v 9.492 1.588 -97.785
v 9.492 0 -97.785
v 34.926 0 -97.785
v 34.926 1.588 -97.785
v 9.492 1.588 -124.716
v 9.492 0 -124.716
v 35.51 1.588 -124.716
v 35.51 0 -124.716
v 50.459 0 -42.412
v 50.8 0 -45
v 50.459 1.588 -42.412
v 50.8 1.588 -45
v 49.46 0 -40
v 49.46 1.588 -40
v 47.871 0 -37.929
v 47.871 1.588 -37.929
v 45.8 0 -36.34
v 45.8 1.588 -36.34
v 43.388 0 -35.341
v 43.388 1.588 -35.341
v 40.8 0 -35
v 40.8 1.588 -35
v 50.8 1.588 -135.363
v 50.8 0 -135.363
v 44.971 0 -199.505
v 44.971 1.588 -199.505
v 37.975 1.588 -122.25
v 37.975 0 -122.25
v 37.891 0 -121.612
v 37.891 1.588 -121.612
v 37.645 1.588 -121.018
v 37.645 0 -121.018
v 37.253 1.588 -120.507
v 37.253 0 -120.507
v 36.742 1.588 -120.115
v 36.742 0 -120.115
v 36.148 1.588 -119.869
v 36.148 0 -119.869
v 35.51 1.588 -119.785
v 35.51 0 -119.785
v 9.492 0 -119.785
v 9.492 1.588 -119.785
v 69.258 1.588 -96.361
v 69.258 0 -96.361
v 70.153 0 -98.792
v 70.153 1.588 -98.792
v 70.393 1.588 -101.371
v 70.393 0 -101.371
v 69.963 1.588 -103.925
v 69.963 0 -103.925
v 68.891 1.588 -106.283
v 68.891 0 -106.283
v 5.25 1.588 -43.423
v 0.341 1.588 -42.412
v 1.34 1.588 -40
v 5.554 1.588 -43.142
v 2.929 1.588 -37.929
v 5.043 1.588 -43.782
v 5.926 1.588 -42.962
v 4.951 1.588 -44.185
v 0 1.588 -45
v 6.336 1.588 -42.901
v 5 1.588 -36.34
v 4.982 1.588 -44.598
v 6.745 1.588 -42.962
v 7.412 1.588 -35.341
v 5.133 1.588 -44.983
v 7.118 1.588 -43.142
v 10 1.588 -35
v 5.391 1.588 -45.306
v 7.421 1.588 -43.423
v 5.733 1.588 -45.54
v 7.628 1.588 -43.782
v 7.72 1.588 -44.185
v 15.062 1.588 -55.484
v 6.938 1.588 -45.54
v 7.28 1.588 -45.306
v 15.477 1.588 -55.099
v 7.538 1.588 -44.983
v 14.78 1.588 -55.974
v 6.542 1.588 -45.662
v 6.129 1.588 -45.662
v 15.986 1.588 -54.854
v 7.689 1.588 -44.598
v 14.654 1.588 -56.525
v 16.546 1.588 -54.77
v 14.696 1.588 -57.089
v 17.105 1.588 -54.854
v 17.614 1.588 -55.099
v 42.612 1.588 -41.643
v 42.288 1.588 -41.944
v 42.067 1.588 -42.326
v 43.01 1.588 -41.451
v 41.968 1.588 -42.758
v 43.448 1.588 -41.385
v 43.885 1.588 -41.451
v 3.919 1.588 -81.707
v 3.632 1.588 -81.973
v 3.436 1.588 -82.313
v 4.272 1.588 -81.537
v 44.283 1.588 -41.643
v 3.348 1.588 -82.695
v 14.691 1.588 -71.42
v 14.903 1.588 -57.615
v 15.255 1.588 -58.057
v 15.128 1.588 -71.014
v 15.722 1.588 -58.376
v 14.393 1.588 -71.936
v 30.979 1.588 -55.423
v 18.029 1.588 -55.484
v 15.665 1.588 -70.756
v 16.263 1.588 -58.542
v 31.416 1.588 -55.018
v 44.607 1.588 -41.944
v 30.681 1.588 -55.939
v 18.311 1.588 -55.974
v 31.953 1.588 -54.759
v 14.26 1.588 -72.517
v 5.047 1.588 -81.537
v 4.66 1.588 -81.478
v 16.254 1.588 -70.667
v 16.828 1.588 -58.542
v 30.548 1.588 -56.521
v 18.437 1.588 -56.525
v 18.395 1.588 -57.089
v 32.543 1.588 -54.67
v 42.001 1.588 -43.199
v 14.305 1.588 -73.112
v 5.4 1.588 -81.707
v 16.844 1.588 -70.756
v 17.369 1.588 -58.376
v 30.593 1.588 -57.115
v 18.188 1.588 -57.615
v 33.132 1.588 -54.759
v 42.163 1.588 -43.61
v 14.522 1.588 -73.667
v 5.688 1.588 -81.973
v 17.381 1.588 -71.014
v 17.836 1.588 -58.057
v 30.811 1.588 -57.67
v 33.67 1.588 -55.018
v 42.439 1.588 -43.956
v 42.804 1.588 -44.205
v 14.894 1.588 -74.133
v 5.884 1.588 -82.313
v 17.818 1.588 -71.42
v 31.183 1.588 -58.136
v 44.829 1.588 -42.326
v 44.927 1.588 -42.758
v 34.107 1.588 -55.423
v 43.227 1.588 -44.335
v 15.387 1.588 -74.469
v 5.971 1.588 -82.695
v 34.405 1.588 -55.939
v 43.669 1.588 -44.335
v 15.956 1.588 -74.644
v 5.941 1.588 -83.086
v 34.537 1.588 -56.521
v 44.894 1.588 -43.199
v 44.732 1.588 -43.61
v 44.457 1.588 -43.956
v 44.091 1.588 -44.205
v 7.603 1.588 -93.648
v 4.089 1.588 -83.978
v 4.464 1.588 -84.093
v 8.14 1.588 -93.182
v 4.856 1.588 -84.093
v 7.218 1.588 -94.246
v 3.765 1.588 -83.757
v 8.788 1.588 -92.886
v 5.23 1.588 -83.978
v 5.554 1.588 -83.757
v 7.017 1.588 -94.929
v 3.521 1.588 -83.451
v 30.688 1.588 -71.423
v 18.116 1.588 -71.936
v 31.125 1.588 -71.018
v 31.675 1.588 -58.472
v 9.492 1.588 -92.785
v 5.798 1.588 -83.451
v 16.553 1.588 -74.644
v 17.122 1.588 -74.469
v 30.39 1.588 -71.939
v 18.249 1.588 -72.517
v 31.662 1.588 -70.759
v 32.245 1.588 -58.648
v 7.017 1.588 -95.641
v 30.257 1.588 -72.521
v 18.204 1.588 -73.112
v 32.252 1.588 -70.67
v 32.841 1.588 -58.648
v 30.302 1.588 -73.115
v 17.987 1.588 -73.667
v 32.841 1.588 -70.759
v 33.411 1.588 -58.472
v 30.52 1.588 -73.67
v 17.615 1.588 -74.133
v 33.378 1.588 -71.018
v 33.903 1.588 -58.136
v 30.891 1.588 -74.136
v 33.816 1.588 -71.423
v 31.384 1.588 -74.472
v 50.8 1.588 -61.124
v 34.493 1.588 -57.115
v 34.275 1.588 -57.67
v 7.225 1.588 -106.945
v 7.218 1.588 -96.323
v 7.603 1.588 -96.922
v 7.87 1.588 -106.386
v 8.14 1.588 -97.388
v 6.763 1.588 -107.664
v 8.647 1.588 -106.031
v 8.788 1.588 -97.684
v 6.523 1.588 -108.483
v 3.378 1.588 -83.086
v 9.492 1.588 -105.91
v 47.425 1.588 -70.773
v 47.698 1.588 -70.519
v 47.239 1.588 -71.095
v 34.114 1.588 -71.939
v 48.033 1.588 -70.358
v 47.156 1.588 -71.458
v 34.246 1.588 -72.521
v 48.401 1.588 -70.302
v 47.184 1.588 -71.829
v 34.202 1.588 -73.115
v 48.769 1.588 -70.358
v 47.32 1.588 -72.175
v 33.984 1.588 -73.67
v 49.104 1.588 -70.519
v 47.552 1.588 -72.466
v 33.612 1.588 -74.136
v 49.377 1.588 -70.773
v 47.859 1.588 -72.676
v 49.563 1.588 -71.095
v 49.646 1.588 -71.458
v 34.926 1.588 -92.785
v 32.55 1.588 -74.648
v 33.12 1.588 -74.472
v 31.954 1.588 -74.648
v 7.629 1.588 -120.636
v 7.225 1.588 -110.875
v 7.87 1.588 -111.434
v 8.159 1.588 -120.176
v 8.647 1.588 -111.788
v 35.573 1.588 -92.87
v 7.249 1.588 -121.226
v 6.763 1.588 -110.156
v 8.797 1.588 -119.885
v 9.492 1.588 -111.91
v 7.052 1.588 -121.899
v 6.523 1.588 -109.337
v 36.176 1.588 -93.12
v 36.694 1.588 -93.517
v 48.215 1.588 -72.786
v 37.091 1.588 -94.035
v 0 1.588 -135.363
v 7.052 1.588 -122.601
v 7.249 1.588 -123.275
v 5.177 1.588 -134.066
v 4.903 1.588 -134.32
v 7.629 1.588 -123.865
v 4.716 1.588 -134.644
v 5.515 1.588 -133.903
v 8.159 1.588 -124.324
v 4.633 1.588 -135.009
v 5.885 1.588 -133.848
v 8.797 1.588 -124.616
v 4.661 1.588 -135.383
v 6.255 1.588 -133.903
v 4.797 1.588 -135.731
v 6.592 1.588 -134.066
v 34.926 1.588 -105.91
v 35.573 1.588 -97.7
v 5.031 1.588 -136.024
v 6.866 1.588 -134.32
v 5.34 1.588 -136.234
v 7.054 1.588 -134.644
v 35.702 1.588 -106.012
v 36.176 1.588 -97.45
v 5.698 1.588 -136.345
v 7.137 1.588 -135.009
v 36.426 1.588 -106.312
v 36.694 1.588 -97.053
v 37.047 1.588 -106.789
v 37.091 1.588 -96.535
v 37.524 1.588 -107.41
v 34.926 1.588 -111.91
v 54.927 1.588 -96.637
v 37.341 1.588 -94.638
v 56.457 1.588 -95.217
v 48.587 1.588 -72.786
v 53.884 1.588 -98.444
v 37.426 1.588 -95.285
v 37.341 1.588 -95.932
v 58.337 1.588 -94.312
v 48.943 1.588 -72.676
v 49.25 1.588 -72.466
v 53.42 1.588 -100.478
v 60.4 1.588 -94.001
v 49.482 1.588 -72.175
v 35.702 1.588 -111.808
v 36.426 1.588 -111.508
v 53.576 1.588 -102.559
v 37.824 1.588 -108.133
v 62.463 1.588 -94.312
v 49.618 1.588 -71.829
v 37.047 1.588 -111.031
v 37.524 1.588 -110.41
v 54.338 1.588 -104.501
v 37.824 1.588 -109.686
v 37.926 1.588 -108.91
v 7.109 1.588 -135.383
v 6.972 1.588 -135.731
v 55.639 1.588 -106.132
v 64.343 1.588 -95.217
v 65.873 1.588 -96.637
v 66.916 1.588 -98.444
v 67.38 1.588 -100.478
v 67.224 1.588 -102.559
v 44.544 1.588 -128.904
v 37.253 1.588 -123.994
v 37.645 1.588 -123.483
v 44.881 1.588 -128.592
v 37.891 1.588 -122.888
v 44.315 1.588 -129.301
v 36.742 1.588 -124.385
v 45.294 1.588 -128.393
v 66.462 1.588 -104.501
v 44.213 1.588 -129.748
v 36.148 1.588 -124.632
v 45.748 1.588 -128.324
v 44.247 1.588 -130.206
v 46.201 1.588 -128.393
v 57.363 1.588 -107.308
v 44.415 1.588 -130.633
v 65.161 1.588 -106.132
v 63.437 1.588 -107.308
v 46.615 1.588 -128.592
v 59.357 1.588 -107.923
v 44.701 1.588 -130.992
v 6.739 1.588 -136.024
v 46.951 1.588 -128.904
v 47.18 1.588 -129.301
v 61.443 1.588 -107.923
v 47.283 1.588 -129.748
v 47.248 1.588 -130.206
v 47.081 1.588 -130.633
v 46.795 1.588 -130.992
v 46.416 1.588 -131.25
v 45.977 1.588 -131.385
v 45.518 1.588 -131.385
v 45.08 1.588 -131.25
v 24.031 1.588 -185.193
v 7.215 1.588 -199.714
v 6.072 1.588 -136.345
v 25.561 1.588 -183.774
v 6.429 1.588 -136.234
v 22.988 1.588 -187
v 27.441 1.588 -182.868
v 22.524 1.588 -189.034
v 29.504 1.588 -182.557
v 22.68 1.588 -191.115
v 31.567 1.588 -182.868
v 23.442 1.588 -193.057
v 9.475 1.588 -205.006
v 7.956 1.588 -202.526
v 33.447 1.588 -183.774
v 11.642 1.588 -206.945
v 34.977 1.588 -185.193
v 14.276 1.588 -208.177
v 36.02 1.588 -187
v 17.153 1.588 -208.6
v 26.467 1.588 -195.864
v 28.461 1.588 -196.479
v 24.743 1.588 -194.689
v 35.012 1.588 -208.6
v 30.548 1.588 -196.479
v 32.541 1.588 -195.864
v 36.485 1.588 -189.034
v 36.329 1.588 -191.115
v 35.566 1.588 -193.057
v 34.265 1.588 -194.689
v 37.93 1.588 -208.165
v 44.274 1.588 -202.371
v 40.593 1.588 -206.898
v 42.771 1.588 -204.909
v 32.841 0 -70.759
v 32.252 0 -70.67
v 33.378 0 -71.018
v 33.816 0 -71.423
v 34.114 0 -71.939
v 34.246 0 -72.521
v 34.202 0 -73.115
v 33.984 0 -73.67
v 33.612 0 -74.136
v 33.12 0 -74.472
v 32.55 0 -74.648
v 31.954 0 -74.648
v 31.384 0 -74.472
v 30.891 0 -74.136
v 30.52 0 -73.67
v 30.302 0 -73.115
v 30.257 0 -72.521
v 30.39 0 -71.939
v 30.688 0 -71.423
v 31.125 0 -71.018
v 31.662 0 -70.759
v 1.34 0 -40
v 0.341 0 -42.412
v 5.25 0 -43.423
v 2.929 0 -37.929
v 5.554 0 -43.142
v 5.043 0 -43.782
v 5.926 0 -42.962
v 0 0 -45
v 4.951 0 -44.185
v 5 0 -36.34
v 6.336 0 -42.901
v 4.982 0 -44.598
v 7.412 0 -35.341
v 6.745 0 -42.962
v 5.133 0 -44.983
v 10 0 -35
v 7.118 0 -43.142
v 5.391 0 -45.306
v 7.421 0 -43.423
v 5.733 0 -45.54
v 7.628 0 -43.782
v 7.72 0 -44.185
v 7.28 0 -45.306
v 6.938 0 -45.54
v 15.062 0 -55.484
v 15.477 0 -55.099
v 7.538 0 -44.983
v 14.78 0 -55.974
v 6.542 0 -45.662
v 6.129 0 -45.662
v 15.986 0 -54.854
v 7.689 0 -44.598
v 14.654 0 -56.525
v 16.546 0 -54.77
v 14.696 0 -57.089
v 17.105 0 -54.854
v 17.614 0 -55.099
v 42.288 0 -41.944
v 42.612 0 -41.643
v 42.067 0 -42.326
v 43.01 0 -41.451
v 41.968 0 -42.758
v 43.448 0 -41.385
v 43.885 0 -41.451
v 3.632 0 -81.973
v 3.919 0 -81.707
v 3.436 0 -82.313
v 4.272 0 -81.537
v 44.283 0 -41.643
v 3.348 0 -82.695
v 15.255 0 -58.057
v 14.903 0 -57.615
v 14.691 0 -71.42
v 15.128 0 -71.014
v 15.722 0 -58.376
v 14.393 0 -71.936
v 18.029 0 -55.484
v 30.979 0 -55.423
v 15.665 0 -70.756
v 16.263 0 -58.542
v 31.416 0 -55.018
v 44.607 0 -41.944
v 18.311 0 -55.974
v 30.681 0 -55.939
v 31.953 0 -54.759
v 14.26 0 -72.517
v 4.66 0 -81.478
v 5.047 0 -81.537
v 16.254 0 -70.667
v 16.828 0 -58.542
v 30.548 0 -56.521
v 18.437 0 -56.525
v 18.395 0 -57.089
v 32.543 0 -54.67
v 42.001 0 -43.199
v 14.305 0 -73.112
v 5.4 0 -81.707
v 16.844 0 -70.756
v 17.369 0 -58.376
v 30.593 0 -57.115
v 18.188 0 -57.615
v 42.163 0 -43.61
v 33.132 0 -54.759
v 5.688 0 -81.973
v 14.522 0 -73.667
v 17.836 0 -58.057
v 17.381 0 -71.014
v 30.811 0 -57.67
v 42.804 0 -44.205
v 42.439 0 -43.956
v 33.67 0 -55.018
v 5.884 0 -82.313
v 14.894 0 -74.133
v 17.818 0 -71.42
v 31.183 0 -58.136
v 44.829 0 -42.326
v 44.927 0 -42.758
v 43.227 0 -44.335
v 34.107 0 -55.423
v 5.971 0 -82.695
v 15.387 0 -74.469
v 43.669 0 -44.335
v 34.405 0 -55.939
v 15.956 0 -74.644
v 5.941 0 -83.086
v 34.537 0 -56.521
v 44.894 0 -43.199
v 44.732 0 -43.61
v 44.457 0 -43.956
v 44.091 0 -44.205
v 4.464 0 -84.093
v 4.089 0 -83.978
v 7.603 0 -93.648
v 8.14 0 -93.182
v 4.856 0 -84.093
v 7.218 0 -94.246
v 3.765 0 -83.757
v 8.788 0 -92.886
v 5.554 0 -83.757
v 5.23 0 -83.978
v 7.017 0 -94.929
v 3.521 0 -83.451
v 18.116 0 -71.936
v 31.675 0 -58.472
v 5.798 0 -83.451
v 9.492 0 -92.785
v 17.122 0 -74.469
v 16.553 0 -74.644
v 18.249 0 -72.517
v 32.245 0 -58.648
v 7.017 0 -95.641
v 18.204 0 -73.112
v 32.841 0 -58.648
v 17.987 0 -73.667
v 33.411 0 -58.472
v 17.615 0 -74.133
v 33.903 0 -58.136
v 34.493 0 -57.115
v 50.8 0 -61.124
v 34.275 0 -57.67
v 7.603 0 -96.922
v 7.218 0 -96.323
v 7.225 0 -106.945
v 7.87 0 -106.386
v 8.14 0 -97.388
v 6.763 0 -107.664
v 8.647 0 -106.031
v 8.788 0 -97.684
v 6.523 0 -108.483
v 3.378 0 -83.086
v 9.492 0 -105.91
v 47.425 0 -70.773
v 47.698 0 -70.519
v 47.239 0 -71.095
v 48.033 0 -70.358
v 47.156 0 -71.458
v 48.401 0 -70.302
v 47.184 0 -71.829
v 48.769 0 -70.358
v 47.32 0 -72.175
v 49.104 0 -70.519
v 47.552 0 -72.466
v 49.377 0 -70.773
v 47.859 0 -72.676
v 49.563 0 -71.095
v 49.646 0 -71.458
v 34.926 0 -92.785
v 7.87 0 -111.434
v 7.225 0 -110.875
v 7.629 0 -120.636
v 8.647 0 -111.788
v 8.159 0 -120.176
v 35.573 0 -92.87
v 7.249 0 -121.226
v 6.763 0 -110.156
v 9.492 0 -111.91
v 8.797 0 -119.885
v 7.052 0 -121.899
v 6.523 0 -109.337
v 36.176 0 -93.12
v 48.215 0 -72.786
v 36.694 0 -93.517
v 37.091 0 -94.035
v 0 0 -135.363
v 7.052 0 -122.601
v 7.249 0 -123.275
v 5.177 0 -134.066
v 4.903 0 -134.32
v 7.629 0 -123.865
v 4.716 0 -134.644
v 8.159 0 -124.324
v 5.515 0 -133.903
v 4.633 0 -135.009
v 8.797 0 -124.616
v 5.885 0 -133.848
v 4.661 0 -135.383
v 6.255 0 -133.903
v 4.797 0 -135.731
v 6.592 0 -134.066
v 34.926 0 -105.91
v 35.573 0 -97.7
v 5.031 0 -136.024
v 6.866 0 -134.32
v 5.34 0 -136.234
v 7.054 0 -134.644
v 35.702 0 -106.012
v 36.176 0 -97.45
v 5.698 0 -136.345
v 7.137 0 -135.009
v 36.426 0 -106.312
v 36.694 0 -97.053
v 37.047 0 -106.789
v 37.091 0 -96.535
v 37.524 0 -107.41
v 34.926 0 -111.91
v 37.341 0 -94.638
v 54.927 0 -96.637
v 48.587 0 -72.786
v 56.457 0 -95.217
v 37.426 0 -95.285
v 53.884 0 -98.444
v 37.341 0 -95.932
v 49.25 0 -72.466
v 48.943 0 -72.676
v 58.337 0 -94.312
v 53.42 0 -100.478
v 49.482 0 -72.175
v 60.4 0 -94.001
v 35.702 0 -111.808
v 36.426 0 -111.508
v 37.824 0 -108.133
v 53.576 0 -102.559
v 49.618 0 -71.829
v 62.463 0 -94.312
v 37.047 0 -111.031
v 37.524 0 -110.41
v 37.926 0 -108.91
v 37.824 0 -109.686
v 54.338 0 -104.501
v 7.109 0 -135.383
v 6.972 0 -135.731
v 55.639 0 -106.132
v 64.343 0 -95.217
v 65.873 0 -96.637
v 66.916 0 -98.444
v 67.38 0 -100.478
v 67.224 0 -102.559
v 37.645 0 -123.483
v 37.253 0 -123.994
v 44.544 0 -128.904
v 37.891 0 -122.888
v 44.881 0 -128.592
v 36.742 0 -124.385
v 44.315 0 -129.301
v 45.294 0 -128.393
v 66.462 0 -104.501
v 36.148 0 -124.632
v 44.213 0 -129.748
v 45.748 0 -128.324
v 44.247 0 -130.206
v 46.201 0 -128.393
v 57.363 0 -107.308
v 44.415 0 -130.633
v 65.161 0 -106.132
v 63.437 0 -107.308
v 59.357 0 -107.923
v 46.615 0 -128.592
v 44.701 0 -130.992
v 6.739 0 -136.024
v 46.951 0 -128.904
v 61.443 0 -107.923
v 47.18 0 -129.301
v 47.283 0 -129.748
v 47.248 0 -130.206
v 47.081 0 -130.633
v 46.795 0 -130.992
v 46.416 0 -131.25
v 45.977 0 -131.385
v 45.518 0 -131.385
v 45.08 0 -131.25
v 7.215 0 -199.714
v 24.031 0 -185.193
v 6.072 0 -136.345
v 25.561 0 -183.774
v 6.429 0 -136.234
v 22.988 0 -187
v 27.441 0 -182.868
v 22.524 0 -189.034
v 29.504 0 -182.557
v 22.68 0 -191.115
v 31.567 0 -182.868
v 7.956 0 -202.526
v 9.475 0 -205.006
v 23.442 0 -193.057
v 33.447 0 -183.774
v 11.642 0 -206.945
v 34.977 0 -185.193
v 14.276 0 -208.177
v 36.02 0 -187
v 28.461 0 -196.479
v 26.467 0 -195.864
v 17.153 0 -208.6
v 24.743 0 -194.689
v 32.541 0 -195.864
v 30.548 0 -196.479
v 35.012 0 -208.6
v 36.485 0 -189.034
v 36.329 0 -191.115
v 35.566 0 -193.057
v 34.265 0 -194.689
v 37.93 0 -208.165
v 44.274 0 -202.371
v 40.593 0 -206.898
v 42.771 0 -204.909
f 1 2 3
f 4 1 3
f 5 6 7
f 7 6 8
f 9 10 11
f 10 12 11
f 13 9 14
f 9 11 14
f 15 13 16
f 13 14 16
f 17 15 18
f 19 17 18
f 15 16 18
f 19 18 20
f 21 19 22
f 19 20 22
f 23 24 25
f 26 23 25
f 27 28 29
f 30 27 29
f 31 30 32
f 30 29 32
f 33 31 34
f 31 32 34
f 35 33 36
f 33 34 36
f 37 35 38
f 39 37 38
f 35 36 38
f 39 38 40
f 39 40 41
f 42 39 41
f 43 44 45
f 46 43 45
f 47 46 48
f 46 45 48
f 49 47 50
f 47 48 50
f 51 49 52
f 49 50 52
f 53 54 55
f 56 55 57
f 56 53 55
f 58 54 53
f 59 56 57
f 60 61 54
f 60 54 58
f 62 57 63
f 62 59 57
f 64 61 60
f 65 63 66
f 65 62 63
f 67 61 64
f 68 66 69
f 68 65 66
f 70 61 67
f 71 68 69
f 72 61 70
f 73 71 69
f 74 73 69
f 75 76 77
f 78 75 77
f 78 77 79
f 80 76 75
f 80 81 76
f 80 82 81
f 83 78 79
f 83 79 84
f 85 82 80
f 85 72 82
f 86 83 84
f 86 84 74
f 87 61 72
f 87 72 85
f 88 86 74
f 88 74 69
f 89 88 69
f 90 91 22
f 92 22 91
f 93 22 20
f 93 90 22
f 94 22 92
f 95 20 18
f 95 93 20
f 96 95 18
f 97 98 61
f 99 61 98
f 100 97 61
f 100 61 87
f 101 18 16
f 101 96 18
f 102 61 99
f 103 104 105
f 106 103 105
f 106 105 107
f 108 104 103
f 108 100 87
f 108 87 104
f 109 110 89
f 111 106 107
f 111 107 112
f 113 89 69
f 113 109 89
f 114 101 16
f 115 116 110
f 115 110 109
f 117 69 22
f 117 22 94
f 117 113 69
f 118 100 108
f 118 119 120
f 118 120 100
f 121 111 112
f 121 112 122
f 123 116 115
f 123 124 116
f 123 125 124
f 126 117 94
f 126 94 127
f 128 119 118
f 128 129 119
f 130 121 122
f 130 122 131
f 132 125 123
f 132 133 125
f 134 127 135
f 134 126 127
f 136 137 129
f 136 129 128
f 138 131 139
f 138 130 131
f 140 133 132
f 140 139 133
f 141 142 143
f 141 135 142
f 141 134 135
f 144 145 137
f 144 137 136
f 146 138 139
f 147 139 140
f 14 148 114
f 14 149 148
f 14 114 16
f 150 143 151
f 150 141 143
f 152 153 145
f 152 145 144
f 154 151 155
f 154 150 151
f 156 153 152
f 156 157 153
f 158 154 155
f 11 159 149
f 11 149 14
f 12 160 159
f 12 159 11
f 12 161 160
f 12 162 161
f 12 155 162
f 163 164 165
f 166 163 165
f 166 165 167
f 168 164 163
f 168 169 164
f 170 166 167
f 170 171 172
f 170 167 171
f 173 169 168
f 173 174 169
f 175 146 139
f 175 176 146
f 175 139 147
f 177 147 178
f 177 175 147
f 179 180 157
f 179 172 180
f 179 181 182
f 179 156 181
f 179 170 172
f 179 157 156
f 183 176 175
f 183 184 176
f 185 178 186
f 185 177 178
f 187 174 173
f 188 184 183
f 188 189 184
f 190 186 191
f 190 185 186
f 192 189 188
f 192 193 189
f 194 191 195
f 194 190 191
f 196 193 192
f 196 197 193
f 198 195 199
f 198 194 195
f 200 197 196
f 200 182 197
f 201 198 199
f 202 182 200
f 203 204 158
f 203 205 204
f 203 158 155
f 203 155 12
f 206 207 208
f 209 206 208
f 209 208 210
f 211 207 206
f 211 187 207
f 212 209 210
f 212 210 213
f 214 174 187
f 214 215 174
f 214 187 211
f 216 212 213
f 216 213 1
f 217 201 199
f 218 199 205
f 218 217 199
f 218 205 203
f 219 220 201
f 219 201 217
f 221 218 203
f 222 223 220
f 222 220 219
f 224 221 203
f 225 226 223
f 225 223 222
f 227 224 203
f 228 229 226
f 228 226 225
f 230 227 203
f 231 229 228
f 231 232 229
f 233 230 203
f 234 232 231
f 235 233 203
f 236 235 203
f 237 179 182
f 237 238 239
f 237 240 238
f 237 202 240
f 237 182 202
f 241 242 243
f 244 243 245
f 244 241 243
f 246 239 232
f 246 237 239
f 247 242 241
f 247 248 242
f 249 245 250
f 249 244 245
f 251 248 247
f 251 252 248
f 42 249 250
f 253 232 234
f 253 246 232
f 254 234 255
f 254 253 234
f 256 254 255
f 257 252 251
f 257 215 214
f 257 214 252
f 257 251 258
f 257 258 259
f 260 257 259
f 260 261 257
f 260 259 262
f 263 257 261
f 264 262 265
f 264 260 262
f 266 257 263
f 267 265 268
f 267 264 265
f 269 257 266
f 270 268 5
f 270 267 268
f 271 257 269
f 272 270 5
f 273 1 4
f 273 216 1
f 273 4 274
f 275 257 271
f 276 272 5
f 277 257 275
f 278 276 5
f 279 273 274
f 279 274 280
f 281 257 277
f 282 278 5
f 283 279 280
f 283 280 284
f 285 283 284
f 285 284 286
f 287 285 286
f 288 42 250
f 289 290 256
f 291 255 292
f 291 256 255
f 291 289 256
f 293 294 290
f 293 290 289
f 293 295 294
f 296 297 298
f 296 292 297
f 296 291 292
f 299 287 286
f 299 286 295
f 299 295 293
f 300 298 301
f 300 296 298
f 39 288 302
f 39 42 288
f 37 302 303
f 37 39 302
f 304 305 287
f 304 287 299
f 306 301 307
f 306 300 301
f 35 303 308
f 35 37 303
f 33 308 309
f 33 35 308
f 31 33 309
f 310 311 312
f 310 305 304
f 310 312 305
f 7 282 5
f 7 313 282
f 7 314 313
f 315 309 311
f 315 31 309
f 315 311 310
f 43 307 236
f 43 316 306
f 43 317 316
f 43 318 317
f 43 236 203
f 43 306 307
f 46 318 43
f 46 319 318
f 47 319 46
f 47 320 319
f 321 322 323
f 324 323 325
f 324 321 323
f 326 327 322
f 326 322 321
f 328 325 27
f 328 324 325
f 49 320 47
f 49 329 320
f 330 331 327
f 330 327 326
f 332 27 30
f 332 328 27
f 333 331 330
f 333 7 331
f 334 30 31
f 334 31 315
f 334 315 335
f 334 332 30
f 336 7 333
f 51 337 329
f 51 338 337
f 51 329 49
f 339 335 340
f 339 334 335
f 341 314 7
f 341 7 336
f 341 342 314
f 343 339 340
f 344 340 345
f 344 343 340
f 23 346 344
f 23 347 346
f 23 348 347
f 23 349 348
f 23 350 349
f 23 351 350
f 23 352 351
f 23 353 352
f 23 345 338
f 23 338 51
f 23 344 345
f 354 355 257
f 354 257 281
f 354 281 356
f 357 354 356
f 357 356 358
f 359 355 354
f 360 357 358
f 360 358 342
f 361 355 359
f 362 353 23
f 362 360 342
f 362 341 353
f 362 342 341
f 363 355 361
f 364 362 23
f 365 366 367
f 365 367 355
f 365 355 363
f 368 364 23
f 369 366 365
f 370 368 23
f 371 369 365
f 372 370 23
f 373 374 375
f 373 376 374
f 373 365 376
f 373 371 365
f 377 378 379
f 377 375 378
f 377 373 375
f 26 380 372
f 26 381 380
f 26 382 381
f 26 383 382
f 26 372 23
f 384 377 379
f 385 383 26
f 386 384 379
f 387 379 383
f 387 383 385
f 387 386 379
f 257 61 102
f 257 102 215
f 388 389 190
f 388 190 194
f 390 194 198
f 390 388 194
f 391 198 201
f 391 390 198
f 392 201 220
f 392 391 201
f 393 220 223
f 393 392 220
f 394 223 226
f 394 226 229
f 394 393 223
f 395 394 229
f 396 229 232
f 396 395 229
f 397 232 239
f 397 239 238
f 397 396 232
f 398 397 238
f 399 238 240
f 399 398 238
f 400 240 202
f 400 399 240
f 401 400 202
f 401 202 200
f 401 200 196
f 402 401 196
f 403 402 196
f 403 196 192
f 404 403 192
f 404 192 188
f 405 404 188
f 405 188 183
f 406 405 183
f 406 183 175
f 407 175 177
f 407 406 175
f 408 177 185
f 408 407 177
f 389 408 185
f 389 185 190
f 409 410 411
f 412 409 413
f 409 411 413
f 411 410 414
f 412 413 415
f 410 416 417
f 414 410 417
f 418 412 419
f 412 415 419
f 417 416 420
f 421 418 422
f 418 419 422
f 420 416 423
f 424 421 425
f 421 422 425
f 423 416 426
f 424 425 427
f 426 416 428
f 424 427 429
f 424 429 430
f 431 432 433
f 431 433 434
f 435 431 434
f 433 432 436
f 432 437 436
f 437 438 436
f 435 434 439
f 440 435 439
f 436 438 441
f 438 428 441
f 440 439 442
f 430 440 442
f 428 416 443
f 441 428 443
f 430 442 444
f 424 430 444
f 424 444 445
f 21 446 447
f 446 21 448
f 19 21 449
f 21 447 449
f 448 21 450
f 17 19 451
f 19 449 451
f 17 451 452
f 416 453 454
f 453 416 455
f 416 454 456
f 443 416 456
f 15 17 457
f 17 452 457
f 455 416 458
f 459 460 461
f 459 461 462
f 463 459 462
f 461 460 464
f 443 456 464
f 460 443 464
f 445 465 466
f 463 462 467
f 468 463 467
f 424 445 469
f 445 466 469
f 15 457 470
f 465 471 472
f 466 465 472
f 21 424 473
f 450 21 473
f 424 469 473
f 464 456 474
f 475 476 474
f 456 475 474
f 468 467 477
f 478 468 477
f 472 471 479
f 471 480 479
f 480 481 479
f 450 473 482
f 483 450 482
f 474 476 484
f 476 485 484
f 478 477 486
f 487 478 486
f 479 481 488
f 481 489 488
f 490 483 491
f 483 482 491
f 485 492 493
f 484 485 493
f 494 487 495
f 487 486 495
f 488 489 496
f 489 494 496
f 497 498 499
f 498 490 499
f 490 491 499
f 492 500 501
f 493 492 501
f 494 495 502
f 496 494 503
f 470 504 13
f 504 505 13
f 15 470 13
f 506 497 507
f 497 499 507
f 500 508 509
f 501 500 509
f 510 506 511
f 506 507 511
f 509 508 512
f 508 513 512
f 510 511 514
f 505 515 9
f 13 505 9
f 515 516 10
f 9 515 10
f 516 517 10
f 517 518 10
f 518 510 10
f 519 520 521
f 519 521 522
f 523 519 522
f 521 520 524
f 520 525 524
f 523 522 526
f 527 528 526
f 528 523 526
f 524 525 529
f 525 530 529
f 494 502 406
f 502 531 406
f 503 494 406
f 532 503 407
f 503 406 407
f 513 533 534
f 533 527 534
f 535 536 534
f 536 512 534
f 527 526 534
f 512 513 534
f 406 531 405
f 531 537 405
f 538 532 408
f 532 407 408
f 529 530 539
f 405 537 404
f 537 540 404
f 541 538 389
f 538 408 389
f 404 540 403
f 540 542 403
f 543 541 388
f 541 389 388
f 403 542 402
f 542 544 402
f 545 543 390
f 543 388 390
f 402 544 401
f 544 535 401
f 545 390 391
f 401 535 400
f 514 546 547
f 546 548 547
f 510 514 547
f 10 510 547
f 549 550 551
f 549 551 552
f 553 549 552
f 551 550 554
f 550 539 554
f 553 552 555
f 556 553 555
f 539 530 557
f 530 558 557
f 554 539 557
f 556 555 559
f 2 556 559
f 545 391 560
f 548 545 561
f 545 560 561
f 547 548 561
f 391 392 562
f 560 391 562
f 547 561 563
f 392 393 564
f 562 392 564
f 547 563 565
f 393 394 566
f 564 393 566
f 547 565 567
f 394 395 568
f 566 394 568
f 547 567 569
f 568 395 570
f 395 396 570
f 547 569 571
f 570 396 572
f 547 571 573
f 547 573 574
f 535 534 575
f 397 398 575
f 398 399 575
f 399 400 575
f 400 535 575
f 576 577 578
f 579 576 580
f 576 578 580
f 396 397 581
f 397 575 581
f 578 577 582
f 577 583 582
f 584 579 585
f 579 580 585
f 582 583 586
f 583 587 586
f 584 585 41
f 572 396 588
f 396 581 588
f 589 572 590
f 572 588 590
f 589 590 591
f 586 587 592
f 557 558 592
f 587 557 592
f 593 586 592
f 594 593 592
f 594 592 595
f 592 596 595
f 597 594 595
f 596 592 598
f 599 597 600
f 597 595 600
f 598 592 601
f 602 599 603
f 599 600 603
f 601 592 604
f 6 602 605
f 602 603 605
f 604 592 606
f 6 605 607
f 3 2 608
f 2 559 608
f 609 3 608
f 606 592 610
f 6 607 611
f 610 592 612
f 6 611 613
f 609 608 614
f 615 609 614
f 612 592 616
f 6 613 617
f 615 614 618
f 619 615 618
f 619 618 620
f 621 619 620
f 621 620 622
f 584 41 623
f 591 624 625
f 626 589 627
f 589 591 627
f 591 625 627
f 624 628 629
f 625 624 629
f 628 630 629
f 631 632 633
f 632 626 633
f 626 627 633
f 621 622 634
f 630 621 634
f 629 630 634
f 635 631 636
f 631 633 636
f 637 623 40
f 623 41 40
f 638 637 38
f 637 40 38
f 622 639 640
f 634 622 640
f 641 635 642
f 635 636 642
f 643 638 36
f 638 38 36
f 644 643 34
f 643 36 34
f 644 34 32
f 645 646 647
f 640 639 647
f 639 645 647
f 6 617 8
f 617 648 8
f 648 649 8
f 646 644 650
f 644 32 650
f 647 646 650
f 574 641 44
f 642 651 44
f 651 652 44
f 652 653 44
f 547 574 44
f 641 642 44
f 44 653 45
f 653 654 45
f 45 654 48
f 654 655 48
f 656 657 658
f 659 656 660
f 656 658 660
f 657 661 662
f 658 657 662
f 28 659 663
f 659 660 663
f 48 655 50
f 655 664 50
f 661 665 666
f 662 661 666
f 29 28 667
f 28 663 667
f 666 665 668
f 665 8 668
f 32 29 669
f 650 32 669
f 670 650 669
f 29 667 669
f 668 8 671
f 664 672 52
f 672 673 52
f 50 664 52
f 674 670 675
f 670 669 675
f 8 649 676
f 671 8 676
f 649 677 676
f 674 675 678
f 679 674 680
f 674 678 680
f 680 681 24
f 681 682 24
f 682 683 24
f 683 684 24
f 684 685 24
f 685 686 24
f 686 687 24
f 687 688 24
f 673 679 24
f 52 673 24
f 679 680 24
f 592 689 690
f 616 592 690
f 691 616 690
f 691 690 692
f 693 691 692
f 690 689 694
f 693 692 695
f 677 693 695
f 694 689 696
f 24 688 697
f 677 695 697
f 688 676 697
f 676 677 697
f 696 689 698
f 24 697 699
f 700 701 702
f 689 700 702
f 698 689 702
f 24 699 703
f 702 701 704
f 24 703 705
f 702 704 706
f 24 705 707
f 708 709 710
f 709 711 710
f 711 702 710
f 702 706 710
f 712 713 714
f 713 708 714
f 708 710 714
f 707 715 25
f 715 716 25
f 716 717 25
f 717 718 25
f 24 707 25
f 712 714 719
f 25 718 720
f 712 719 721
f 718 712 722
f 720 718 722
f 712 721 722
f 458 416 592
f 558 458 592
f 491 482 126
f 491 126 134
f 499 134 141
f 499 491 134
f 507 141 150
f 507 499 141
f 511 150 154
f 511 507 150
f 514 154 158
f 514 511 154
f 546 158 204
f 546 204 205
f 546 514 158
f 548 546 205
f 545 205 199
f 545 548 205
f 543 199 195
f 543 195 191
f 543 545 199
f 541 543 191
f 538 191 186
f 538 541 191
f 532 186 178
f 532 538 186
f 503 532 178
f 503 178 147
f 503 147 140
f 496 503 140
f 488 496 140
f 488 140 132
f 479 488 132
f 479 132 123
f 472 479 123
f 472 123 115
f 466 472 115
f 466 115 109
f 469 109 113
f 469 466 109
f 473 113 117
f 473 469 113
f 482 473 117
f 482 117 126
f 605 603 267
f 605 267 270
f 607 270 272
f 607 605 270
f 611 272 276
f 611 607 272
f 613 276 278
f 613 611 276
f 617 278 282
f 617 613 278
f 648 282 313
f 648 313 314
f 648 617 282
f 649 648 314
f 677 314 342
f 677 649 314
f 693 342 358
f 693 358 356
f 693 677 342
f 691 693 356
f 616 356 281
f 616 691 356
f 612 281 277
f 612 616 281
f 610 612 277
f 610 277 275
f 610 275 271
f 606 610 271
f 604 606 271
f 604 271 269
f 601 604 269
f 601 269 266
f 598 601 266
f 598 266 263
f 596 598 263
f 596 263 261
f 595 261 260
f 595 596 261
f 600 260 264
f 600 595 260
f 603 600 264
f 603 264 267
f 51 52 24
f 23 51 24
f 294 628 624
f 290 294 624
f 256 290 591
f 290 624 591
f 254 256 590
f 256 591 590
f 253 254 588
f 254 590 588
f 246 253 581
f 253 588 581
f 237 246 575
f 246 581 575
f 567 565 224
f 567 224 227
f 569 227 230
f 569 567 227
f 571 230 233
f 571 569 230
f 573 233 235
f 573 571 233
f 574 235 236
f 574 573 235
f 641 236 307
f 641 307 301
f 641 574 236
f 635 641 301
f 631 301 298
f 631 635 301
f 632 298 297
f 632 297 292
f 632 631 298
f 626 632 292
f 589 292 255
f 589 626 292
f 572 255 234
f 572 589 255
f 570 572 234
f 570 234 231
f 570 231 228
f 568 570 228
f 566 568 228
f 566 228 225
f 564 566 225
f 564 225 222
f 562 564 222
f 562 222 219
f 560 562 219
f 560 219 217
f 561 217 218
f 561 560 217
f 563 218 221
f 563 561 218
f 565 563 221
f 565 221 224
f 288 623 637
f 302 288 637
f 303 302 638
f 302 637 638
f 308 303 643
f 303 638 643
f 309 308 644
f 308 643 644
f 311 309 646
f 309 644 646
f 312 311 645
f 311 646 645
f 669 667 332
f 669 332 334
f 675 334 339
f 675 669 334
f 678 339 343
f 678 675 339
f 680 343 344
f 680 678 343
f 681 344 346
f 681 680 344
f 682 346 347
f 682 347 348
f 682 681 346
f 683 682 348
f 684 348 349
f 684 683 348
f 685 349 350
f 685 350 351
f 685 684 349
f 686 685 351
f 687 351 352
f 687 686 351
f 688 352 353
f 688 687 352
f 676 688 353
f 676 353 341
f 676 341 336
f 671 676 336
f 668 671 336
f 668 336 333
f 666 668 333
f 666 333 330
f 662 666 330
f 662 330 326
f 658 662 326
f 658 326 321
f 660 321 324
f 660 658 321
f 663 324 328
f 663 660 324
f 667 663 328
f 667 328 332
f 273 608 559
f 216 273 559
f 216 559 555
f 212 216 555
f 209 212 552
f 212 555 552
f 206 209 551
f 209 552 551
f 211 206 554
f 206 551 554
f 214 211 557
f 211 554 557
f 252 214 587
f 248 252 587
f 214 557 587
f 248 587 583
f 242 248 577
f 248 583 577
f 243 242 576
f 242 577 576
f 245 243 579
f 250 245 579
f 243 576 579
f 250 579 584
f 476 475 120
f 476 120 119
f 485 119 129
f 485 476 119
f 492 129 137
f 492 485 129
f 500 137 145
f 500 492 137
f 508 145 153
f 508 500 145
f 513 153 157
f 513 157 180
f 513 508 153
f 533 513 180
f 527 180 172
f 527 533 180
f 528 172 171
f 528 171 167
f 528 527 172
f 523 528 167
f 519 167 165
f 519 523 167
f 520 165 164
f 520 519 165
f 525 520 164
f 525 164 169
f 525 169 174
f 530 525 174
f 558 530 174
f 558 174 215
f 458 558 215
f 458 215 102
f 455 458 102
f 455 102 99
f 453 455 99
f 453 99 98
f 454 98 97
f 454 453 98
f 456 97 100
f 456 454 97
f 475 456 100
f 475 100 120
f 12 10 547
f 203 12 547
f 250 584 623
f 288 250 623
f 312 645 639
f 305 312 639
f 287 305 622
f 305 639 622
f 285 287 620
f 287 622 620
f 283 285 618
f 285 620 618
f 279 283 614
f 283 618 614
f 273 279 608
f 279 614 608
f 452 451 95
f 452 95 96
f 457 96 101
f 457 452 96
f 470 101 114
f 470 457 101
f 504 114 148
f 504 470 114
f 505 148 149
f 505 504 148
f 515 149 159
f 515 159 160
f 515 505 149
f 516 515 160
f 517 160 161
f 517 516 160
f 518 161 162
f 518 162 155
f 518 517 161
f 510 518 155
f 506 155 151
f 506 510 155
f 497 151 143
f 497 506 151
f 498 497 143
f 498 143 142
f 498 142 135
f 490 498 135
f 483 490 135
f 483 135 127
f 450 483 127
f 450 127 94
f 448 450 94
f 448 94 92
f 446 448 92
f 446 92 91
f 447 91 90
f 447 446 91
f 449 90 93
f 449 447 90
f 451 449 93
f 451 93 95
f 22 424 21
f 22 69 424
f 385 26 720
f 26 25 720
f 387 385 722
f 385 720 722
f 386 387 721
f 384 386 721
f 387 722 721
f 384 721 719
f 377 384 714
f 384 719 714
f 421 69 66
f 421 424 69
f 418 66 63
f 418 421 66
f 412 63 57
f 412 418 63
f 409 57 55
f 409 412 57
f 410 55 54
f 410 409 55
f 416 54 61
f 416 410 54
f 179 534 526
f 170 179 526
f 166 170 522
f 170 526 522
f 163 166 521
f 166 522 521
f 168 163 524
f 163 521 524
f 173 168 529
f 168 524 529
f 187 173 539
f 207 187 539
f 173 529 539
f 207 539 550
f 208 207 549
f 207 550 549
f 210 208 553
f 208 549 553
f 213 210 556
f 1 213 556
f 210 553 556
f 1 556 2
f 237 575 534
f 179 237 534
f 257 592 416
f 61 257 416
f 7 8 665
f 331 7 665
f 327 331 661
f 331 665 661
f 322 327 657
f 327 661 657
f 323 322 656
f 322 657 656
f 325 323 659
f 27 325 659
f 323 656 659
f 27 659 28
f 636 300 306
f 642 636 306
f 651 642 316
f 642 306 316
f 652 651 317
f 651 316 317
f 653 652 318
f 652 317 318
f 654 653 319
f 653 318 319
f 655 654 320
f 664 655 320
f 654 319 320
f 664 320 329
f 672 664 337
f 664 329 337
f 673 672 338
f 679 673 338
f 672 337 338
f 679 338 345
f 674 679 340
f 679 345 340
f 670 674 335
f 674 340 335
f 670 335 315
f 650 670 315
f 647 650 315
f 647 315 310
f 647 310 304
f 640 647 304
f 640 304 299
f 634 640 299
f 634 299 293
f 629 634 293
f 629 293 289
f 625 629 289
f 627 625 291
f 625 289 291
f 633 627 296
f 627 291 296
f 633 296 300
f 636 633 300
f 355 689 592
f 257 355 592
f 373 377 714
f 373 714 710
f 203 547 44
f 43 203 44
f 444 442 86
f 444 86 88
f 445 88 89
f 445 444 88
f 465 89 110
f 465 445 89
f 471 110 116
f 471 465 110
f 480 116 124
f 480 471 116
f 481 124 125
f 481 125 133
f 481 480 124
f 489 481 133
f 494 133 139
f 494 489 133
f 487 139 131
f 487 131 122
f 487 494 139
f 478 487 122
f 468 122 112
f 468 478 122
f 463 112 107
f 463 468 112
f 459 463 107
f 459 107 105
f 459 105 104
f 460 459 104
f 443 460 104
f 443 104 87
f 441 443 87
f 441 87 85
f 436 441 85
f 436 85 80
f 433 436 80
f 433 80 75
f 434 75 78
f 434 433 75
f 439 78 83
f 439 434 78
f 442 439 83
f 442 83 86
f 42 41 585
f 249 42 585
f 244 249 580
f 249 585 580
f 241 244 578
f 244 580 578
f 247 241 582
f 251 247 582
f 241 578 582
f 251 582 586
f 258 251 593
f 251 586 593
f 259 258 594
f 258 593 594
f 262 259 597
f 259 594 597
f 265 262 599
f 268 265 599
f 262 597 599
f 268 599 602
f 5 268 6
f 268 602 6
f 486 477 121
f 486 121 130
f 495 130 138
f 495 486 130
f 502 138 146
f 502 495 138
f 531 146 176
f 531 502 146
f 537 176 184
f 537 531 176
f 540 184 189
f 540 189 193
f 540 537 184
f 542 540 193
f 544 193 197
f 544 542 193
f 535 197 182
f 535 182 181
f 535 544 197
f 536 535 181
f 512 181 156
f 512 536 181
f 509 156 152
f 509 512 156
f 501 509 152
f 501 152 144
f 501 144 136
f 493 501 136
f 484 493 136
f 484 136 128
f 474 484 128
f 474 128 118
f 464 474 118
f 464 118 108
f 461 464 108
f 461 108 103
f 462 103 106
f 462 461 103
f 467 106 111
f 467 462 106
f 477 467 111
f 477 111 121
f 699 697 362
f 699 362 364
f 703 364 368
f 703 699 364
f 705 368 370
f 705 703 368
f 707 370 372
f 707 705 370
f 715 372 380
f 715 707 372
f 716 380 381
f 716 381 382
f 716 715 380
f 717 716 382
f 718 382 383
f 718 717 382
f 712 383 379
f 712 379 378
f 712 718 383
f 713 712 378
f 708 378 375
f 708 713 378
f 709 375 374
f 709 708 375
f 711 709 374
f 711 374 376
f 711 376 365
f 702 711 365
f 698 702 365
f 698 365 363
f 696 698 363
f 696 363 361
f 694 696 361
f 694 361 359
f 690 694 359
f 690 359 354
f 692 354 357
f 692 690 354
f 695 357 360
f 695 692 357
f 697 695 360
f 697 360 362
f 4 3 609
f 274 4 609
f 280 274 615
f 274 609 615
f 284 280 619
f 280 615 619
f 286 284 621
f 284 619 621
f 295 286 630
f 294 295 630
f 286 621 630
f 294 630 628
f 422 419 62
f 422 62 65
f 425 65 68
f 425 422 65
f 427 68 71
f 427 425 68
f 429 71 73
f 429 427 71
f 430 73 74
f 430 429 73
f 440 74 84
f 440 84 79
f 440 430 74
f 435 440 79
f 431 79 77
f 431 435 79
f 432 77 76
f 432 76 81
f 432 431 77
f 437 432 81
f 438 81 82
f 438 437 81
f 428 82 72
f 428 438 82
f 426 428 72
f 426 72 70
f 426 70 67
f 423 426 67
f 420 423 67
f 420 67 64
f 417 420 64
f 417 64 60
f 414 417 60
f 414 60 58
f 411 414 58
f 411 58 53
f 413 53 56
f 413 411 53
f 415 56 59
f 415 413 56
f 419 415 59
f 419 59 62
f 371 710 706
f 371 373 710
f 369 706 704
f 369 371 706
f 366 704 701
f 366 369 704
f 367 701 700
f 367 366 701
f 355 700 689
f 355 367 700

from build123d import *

# Parameters (mm, degrees)
SKETCH1_R           = 1.388229101
SKETCH1_R_2         = 1.896979128
SKETCH1_R_3         = 2
SKETCH1_R_4         = 1.314910669
SKETCH1_R_5         = 1.483383261
SKETCH1_R_6         = 1.248623853
SKETCH1_R_7         = 1.255629307
SKETCH1_R_8         = 7
SKETCH1_R_9         = 1.53911217
BOSS_EXTRUDE1_DEPTH = 1.5875
SKETCH4_W           = 66.272407177
SKETCH4_H           = 27.800260981
CUT_EXTRUDE2_DEPTH  = 20
FILLET3_R           = 10
FILLET4_R           = 10
BOSS_EXTRUDE3_START = -1.5875
BOSS_EXTRUDE3_DEPTH = 1.5875
SKETCH7_R           = 7
CUT_EXTRUDE3_DEPTH  = 1.5875
SKETCH8_W           = 100.106183873
SKETCH8_H           = 60.21728362
CUT_EXTRUDE4_DEPTH  = 35
FILLET5_R           = 10


with BuildPart() as part:
    # Sketch1 → Boss-Extrude1 (new body)
    with BuildSketch(Plane(origin=(0, 0, 0), x_dir=(1, 0, 0), z_dir=(0, 1, 0))):
        with BuildLine():
            Line((42.32729629, 228.6), (10.454309325, 228.6))
            Line((10.454309325, 228.6), (0, 135.362739137))
            Line((0, 135.362739137), (0, 0))
            Line((0, 0), (24.327009544, 0))
            Line((24.327009544, 0), (50.8, 0))
            Line((50.8, 0), (50.8, 64.87909603))
            Line((50.8, 64.87909603), (50.8, 87.423477361))
            Line((50.8, 87.423477361), (50.8, 98.200996728))
            ThreePointArc((50.8, 98.200996728), (50.4, 101.000996728), (50.8, 103.800996728))
            Line((50.8, 103.800996728), (50.8, 104.488200565))
            Line((50.8, 104.488200565), (50.8, 120.619222808))
            Line((50.8, 120.619222808), (50.8, 135.362739137))
            Line((50.8, 135.362739137), (42.32729629, 228.6))
        make_face()
        with Locations(Location((6.335590122, 44.288799513, 0), (0, 0, 270))):
            Circle(SKETCH1_R, mode=Mode.SUBTRACT)
        with Locations(Location((16.545548495, 56.66670766, 0), (0, 0, 270))):
            Circle(SKETCH1_R_2, mode=Mode.SUBTRACT)
        with Locations(Location((32.542900948, 56.67, 0), (0, 0, 270))):
            Circle(SKETCH1_R_3, mode=Mode.SUBTRACT)
        with Locations(Location((4.659546827, 82.793173401, 0), (0, 0, 270))):
            Circle(SKETCH1_R_4, mode=Mode.SUBTRACT)
        with Locations(Location((16.254490953, 72.66670766, 0), (0, 0, 270))):
            Circle(SKETCH1_R_3, mode=Mode.SUBTRACT)
        with Locations(Location((32.251843406, 72.67, 0), (0, 0, 270))):
            Circle(SKETCH1_R_3, mode=Mode.SUBTRACT)
        with BuildLine():
            Line((34.925740903, 92.78493524), (9.492033273, 92.78493524))
            ThreePointArc((9.492033273, 92.78493524), (6.992033273, 95.28493524), (9.492033273, 97.78493524))
            Line((9.492033273, 97.78493524), (34.925740903, 97.78493524))
            ThreePointArc((34.925740903, 97.78493524), (36.693507856, 97.052702193), (37.425740903, 95.28493524))
            ThreePointArc((37.425740903, 95.28493524), (36.693507856, 93.517168287), (34.925740903, 92.78493524))
        make_face(mode=Mode.SUBTRACT)
        with BuildLine():
            Line((34.925740903, 105.90993524), (9.492033273, 105.90993524))
            ThreePointArc((9.492033273, 105.90993524), (6.492033273, 108.90993524), (9.492033273, 111.90993524))
            Line((9.492033273, 111.90993524), (34.925740903, 111.90993524))
            ThreePointArc((34.925740903, 111.90993524), (37.047061246, 111.031255584), (37.925740903, 108.90993524))
            ThreePointArc((37.925740903, 108.90993524), (37.047061246, 106.788614896), (34.925740903, 105.90993524))
        make_face(mode=Mode.SUBTRACT)
        with Locations(Location((43.447673368, 42.868436544, 0), (0, 0, 270))):
            Circle(SKETCH1_R_5, mode=Mode.SUBTRACT)
        with Locations(Location((48.400988852, 71.551011715, 0), (0, 0, 270))):
            Circle(SKETCH1_R_6, mode=Mode.SUBTRACT)
        with Locations(Location((5.88467603, 135.103145298, 0), (0, 0, 270))):
            Circle(SKETCH1_R_7, mode=Mode.SUBTRACT)
        with BuildLine():
            Line((35.509675341, 119.784935244), (9.492033273, 119.784935244))
            ThreePointArc((9.492033273, 119.784935244), (7.026609419, 122.250359097), (9.492033273, 124.71578295))
            Line((9.492033273, 124.71578295), (35.509675341, 124.71578295))
            ThreePointArc((35.509675341, 124.71578295), (37.252993266, 123.993677022), (37.975099194, 122.250359097))
            ThreePointArc((37.975099194, 122.250359097), (37.252993266, 120.507041172), (35.509675341, 119.784935244))
        make_face(mode=Mode.SUBTRACT)
        with Locations(Location((29.504213454, 189.557234372, 0), (0, 0, 270))):
            Circle(SKETCH1_R_8, mode=Mode.SUBTRACT)
        with Locations(Location((45.747747887, 129.863467374, 0), (0, 0, 270))):
            Circle(SKETCH1_R_9, mode=Mode.SUBTRACT)
    extrude(amount=BOSS_EXTRUDE1_DEPTH)

    # Sketch4 → Cut-Extrude2 (cut)
    with BuildSketch(Plane(origin=(0, 0, -228.6), x_dir=(-1, 0, 0), z_dir=(0, 0, -1))):
        with Locations((-28.174690156, -1.980940155)):
            Rectangle(SKETCH4_W, SKETCH4_H)
    extrude(amount=-CUT_EXTRUDE2_DEPTH, mode=Mode.SUBTRACT)

    # Fillet3
    fillet3_edges = [part.edges().sort_by_distance(p)[0] for p in [
        (44.144746445, 0.79375, -208.6),
    ]]
    fillet(fillet3_edges, radius=FILLET3_R)

    # Fillet4
    fillet4_edges = [part.edges().sort_by_distance(p)[0] for p in [
        (50.8, 0.79375, 0),
        (0, 0.79375, 0),
        (8.211791854, 0.79375, -208.6),
    ]]
    fillet(fillet4_edges, radius=FILLET4_R)

    # Sketch6 → Boss-Extrude3 (add)
    with BuildSketch(Plane(origin=(0, 1.5875, 0), x_dir=(1, 0, 0), z_dir=(0, 1, 0)).offset(BOSS_EXTRUDE3_START)):
        with BuildLine():
            Line((50.8, 135.362739137), (50.8, 103.800996728))
            ThreePointArc((50.8, 103.800996728), (50.4, 101.000996728), (50.8, 98.200996728))
            Line((50.8, 98.200996728), (50.8, 61.124243317))
            Line((50.8, 61.124243317), (69.258211507, 96.360728536))
            ThreePointArc((69.258211507, 96.360728536), (70.393157133, 101.370875786), (68.890940865, 106.283413148))
            Line((68.890940865, 106.283413148), (50.8, 135.362739137))
        make_face()
    extrude(amount=BOSS_EXTRUDE3_DEPTH)

    # Sketch7 → Cut-Extrude3 (cut)
    with BuildSketch(Plane(origin=(0, 1.5875, 0), x_dir=(1, 0, 0), z_dir=(0, 1, 0))):
        with Locations(Location((60.4, 101.000996728, 0), (0, 0, 270))):
            Circle(SKETCH7_R)
    extrude(amount=-CUT_EXTRUDE3_DEPTH, mode=Mode.SUBTRACT)

    # Sketch8 → Cut-Extrude4 (cut)
    with BuildSketch(Plane.XY):
        with Locations((28.455154517, 1.704032249)):
            Rectangle(SKETCH8_W, SKETCH8_H)
    extrude(amount=-CUT_EXTRUDE4_DEPTH, mode=Mode.SUBTRACT)

    # Fillet5
    fillet5_edges = [part.edges().sort_by_distance(p)[0] for p in [
        (0, 0.79375, -35),
        (50.8, 0.79375, -35),
    ]]
    fillet(fillet5_edges, radius=FILLET5_R)


solid = part.part
